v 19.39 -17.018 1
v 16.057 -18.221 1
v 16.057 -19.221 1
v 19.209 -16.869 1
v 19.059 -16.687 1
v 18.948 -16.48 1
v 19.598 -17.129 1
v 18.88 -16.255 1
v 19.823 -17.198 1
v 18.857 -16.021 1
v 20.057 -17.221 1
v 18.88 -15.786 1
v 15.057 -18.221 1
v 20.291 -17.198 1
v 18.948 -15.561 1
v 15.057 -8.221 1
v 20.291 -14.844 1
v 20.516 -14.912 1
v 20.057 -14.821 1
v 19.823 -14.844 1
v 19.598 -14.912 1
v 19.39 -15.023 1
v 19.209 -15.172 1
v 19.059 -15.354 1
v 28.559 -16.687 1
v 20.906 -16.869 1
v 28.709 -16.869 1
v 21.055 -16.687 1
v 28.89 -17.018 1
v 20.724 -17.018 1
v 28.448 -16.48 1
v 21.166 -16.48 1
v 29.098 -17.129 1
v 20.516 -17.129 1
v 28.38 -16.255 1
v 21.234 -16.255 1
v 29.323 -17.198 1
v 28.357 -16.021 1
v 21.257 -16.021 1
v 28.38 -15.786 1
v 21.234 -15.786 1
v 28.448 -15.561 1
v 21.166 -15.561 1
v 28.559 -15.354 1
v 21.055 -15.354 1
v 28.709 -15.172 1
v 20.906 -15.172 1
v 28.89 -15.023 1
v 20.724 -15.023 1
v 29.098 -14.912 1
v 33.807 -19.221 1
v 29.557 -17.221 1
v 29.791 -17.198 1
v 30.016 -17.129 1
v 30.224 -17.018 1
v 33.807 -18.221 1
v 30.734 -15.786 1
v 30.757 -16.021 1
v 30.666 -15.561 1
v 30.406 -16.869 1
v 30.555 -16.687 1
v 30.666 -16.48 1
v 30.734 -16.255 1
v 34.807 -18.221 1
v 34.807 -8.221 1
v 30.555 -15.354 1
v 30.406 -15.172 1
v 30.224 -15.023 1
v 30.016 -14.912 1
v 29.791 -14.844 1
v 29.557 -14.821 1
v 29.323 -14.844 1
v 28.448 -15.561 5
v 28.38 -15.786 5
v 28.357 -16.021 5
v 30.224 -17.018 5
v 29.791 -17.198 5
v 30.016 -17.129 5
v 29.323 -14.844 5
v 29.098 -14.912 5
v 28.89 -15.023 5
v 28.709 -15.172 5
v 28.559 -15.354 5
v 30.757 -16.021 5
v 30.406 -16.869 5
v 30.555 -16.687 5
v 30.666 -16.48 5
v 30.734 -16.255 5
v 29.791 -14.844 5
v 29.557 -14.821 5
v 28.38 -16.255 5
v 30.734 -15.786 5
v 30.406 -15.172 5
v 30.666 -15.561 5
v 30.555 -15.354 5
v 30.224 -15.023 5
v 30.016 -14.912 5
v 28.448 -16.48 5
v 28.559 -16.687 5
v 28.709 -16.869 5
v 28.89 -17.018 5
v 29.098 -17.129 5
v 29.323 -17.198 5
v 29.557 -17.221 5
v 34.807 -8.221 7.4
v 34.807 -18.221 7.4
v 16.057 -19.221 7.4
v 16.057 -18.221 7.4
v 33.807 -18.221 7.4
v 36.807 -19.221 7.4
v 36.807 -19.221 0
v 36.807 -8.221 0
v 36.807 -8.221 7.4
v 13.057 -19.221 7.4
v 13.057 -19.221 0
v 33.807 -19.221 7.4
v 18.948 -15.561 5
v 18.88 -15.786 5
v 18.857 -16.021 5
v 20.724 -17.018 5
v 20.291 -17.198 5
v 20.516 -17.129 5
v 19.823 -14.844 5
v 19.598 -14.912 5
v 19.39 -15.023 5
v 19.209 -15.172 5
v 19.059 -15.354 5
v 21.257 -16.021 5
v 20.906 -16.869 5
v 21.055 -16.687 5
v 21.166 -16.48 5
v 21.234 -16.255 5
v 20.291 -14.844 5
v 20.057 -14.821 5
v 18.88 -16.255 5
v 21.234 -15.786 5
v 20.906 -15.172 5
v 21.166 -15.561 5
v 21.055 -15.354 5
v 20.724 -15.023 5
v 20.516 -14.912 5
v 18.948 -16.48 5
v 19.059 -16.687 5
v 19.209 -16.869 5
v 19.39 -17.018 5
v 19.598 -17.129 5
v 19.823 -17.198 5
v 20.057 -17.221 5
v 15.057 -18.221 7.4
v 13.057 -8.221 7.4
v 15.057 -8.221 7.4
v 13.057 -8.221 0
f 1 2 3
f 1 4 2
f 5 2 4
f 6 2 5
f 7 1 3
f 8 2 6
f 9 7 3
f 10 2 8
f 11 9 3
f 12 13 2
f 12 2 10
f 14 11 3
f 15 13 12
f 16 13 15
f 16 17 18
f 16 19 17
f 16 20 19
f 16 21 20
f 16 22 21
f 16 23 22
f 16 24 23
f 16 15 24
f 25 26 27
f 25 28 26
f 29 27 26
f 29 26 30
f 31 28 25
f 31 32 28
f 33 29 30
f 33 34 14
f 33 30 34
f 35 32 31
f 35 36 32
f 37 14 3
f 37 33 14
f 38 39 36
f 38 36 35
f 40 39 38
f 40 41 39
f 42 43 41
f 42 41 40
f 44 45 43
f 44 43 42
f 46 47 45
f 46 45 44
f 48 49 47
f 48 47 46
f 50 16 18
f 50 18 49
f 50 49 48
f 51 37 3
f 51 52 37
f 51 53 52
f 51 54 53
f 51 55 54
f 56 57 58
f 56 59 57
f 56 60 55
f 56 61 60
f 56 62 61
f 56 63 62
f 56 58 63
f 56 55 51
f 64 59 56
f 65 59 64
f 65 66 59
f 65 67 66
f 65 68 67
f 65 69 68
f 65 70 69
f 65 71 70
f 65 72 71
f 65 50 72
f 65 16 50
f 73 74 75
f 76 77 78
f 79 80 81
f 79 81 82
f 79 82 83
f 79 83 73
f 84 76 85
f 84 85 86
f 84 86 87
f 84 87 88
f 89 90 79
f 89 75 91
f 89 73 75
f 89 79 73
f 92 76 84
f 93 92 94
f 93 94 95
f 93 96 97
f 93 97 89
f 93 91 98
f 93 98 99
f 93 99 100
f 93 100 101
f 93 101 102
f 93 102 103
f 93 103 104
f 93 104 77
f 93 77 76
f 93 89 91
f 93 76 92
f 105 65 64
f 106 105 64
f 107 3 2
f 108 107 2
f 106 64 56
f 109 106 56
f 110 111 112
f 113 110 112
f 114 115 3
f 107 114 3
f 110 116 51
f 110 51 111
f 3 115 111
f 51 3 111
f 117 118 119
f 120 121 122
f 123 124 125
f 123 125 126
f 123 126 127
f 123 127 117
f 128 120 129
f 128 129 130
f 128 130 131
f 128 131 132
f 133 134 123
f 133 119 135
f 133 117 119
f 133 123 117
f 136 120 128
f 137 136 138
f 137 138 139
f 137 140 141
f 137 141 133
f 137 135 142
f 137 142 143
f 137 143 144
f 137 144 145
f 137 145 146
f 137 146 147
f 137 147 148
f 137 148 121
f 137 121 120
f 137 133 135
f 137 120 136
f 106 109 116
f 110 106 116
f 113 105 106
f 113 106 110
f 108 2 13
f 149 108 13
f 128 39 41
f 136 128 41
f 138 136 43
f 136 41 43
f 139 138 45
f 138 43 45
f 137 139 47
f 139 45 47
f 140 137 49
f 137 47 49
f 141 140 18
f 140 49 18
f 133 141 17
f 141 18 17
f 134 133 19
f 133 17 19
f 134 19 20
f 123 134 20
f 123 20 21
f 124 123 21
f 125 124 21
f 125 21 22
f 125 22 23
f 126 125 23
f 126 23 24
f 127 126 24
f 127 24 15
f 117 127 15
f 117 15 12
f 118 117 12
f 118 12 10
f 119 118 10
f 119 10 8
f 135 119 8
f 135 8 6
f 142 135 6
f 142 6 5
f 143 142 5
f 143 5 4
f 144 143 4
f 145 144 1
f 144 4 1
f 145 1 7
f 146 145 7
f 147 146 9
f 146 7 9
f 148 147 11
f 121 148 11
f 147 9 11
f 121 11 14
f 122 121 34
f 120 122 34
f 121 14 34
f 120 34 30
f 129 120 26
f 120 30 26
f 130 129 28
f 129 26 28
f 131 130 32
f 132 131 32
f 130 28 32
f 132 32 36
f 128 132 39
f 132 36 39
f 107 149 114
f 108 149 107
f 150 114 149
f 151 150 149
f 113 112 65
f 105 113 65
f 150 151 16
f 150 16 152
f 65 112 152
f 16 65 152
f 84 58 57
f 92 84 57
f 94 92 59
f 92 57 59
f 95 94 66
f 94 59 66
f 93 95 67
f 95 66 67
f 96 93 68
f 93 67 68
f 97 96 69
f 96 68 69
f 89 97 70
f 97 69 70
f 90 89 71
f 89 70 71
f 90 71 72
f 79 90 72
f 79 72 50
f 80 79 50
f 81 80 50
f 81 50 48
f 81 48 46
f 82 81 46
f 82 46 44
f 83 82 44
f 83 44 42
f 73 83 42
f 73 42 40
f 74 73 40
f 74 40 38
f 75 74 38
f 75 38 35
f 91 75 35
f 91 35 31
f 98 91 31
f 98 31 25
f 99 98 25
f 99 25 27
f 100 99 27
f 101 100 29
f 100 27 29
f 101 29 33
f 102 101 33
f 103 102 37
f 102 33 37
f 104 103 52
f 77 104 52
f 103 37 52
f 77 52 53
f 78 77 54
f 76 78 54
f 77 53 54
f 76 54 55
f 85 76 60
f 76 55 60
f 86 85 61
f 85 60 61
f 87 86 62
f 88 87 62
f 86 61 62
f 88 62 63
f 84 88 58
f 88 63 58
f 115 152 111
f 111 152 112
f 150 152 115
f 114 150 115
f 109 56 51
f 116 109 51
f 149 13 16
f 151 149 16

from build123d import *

# Parameters (mm, degrees)
F0_R     = 1.2
F1_DEPTH = 1
F2_DEPTH = 7.4
F3_DEPTH = 5


with BuildPart() as f1:
    # F0 (on Top) → F1 (new body)
    with BuildSketch(Plane.XY):
        Polygon((34.807068, -8.220604), (15.057068, -8.220604), (15.057068, -18.220604), (16.057068, -18.220604), (16.057068, -19.220604), (33.807068, -19.220604), (33.807068, -18.220604), (34.807068, -18.220604), align=None)
        with Locations((20.057068, -16.020604)):
            Circle(F0_R, mode=Mode.SUBTRACT)
        with Locations((29.557068, -16.020604)):
            Circle(F0_R, mode=Mode.SUBTRACT)
    extrude(amount=F1_DEPTH)

    # F0 (on Top) → F2 (join)
    with BuildSketch(Plane.XY):
        Polygon((15.057068, -8.220604), (13.057068, -8.220604), (13.057068, -19.220604), (16.057068, -19.220604), (16.057068, -18.220604), (15.057068, -18.220604), align=None)
        Polygon((36.807068, -8.220604), (34.807068, -8.220604), (34.807068, -18.220604), (33.807068, -18.220604), (33.807068, -19.220604), (36.807068, -19.220604), align=None)
    extrude(amount=F2_DEPTH)

    # F0 (on Top) → F3 (join)
    with BuildSketch(Plane.XY):
        with Locations((20.057068, -16.020604)):
            Circle(F0_R)
        with Locations((29.557068, -16.020604)):
            Circle(F0_R)
    extrude(amount=F3_DEPTH)


solid = f1.part
